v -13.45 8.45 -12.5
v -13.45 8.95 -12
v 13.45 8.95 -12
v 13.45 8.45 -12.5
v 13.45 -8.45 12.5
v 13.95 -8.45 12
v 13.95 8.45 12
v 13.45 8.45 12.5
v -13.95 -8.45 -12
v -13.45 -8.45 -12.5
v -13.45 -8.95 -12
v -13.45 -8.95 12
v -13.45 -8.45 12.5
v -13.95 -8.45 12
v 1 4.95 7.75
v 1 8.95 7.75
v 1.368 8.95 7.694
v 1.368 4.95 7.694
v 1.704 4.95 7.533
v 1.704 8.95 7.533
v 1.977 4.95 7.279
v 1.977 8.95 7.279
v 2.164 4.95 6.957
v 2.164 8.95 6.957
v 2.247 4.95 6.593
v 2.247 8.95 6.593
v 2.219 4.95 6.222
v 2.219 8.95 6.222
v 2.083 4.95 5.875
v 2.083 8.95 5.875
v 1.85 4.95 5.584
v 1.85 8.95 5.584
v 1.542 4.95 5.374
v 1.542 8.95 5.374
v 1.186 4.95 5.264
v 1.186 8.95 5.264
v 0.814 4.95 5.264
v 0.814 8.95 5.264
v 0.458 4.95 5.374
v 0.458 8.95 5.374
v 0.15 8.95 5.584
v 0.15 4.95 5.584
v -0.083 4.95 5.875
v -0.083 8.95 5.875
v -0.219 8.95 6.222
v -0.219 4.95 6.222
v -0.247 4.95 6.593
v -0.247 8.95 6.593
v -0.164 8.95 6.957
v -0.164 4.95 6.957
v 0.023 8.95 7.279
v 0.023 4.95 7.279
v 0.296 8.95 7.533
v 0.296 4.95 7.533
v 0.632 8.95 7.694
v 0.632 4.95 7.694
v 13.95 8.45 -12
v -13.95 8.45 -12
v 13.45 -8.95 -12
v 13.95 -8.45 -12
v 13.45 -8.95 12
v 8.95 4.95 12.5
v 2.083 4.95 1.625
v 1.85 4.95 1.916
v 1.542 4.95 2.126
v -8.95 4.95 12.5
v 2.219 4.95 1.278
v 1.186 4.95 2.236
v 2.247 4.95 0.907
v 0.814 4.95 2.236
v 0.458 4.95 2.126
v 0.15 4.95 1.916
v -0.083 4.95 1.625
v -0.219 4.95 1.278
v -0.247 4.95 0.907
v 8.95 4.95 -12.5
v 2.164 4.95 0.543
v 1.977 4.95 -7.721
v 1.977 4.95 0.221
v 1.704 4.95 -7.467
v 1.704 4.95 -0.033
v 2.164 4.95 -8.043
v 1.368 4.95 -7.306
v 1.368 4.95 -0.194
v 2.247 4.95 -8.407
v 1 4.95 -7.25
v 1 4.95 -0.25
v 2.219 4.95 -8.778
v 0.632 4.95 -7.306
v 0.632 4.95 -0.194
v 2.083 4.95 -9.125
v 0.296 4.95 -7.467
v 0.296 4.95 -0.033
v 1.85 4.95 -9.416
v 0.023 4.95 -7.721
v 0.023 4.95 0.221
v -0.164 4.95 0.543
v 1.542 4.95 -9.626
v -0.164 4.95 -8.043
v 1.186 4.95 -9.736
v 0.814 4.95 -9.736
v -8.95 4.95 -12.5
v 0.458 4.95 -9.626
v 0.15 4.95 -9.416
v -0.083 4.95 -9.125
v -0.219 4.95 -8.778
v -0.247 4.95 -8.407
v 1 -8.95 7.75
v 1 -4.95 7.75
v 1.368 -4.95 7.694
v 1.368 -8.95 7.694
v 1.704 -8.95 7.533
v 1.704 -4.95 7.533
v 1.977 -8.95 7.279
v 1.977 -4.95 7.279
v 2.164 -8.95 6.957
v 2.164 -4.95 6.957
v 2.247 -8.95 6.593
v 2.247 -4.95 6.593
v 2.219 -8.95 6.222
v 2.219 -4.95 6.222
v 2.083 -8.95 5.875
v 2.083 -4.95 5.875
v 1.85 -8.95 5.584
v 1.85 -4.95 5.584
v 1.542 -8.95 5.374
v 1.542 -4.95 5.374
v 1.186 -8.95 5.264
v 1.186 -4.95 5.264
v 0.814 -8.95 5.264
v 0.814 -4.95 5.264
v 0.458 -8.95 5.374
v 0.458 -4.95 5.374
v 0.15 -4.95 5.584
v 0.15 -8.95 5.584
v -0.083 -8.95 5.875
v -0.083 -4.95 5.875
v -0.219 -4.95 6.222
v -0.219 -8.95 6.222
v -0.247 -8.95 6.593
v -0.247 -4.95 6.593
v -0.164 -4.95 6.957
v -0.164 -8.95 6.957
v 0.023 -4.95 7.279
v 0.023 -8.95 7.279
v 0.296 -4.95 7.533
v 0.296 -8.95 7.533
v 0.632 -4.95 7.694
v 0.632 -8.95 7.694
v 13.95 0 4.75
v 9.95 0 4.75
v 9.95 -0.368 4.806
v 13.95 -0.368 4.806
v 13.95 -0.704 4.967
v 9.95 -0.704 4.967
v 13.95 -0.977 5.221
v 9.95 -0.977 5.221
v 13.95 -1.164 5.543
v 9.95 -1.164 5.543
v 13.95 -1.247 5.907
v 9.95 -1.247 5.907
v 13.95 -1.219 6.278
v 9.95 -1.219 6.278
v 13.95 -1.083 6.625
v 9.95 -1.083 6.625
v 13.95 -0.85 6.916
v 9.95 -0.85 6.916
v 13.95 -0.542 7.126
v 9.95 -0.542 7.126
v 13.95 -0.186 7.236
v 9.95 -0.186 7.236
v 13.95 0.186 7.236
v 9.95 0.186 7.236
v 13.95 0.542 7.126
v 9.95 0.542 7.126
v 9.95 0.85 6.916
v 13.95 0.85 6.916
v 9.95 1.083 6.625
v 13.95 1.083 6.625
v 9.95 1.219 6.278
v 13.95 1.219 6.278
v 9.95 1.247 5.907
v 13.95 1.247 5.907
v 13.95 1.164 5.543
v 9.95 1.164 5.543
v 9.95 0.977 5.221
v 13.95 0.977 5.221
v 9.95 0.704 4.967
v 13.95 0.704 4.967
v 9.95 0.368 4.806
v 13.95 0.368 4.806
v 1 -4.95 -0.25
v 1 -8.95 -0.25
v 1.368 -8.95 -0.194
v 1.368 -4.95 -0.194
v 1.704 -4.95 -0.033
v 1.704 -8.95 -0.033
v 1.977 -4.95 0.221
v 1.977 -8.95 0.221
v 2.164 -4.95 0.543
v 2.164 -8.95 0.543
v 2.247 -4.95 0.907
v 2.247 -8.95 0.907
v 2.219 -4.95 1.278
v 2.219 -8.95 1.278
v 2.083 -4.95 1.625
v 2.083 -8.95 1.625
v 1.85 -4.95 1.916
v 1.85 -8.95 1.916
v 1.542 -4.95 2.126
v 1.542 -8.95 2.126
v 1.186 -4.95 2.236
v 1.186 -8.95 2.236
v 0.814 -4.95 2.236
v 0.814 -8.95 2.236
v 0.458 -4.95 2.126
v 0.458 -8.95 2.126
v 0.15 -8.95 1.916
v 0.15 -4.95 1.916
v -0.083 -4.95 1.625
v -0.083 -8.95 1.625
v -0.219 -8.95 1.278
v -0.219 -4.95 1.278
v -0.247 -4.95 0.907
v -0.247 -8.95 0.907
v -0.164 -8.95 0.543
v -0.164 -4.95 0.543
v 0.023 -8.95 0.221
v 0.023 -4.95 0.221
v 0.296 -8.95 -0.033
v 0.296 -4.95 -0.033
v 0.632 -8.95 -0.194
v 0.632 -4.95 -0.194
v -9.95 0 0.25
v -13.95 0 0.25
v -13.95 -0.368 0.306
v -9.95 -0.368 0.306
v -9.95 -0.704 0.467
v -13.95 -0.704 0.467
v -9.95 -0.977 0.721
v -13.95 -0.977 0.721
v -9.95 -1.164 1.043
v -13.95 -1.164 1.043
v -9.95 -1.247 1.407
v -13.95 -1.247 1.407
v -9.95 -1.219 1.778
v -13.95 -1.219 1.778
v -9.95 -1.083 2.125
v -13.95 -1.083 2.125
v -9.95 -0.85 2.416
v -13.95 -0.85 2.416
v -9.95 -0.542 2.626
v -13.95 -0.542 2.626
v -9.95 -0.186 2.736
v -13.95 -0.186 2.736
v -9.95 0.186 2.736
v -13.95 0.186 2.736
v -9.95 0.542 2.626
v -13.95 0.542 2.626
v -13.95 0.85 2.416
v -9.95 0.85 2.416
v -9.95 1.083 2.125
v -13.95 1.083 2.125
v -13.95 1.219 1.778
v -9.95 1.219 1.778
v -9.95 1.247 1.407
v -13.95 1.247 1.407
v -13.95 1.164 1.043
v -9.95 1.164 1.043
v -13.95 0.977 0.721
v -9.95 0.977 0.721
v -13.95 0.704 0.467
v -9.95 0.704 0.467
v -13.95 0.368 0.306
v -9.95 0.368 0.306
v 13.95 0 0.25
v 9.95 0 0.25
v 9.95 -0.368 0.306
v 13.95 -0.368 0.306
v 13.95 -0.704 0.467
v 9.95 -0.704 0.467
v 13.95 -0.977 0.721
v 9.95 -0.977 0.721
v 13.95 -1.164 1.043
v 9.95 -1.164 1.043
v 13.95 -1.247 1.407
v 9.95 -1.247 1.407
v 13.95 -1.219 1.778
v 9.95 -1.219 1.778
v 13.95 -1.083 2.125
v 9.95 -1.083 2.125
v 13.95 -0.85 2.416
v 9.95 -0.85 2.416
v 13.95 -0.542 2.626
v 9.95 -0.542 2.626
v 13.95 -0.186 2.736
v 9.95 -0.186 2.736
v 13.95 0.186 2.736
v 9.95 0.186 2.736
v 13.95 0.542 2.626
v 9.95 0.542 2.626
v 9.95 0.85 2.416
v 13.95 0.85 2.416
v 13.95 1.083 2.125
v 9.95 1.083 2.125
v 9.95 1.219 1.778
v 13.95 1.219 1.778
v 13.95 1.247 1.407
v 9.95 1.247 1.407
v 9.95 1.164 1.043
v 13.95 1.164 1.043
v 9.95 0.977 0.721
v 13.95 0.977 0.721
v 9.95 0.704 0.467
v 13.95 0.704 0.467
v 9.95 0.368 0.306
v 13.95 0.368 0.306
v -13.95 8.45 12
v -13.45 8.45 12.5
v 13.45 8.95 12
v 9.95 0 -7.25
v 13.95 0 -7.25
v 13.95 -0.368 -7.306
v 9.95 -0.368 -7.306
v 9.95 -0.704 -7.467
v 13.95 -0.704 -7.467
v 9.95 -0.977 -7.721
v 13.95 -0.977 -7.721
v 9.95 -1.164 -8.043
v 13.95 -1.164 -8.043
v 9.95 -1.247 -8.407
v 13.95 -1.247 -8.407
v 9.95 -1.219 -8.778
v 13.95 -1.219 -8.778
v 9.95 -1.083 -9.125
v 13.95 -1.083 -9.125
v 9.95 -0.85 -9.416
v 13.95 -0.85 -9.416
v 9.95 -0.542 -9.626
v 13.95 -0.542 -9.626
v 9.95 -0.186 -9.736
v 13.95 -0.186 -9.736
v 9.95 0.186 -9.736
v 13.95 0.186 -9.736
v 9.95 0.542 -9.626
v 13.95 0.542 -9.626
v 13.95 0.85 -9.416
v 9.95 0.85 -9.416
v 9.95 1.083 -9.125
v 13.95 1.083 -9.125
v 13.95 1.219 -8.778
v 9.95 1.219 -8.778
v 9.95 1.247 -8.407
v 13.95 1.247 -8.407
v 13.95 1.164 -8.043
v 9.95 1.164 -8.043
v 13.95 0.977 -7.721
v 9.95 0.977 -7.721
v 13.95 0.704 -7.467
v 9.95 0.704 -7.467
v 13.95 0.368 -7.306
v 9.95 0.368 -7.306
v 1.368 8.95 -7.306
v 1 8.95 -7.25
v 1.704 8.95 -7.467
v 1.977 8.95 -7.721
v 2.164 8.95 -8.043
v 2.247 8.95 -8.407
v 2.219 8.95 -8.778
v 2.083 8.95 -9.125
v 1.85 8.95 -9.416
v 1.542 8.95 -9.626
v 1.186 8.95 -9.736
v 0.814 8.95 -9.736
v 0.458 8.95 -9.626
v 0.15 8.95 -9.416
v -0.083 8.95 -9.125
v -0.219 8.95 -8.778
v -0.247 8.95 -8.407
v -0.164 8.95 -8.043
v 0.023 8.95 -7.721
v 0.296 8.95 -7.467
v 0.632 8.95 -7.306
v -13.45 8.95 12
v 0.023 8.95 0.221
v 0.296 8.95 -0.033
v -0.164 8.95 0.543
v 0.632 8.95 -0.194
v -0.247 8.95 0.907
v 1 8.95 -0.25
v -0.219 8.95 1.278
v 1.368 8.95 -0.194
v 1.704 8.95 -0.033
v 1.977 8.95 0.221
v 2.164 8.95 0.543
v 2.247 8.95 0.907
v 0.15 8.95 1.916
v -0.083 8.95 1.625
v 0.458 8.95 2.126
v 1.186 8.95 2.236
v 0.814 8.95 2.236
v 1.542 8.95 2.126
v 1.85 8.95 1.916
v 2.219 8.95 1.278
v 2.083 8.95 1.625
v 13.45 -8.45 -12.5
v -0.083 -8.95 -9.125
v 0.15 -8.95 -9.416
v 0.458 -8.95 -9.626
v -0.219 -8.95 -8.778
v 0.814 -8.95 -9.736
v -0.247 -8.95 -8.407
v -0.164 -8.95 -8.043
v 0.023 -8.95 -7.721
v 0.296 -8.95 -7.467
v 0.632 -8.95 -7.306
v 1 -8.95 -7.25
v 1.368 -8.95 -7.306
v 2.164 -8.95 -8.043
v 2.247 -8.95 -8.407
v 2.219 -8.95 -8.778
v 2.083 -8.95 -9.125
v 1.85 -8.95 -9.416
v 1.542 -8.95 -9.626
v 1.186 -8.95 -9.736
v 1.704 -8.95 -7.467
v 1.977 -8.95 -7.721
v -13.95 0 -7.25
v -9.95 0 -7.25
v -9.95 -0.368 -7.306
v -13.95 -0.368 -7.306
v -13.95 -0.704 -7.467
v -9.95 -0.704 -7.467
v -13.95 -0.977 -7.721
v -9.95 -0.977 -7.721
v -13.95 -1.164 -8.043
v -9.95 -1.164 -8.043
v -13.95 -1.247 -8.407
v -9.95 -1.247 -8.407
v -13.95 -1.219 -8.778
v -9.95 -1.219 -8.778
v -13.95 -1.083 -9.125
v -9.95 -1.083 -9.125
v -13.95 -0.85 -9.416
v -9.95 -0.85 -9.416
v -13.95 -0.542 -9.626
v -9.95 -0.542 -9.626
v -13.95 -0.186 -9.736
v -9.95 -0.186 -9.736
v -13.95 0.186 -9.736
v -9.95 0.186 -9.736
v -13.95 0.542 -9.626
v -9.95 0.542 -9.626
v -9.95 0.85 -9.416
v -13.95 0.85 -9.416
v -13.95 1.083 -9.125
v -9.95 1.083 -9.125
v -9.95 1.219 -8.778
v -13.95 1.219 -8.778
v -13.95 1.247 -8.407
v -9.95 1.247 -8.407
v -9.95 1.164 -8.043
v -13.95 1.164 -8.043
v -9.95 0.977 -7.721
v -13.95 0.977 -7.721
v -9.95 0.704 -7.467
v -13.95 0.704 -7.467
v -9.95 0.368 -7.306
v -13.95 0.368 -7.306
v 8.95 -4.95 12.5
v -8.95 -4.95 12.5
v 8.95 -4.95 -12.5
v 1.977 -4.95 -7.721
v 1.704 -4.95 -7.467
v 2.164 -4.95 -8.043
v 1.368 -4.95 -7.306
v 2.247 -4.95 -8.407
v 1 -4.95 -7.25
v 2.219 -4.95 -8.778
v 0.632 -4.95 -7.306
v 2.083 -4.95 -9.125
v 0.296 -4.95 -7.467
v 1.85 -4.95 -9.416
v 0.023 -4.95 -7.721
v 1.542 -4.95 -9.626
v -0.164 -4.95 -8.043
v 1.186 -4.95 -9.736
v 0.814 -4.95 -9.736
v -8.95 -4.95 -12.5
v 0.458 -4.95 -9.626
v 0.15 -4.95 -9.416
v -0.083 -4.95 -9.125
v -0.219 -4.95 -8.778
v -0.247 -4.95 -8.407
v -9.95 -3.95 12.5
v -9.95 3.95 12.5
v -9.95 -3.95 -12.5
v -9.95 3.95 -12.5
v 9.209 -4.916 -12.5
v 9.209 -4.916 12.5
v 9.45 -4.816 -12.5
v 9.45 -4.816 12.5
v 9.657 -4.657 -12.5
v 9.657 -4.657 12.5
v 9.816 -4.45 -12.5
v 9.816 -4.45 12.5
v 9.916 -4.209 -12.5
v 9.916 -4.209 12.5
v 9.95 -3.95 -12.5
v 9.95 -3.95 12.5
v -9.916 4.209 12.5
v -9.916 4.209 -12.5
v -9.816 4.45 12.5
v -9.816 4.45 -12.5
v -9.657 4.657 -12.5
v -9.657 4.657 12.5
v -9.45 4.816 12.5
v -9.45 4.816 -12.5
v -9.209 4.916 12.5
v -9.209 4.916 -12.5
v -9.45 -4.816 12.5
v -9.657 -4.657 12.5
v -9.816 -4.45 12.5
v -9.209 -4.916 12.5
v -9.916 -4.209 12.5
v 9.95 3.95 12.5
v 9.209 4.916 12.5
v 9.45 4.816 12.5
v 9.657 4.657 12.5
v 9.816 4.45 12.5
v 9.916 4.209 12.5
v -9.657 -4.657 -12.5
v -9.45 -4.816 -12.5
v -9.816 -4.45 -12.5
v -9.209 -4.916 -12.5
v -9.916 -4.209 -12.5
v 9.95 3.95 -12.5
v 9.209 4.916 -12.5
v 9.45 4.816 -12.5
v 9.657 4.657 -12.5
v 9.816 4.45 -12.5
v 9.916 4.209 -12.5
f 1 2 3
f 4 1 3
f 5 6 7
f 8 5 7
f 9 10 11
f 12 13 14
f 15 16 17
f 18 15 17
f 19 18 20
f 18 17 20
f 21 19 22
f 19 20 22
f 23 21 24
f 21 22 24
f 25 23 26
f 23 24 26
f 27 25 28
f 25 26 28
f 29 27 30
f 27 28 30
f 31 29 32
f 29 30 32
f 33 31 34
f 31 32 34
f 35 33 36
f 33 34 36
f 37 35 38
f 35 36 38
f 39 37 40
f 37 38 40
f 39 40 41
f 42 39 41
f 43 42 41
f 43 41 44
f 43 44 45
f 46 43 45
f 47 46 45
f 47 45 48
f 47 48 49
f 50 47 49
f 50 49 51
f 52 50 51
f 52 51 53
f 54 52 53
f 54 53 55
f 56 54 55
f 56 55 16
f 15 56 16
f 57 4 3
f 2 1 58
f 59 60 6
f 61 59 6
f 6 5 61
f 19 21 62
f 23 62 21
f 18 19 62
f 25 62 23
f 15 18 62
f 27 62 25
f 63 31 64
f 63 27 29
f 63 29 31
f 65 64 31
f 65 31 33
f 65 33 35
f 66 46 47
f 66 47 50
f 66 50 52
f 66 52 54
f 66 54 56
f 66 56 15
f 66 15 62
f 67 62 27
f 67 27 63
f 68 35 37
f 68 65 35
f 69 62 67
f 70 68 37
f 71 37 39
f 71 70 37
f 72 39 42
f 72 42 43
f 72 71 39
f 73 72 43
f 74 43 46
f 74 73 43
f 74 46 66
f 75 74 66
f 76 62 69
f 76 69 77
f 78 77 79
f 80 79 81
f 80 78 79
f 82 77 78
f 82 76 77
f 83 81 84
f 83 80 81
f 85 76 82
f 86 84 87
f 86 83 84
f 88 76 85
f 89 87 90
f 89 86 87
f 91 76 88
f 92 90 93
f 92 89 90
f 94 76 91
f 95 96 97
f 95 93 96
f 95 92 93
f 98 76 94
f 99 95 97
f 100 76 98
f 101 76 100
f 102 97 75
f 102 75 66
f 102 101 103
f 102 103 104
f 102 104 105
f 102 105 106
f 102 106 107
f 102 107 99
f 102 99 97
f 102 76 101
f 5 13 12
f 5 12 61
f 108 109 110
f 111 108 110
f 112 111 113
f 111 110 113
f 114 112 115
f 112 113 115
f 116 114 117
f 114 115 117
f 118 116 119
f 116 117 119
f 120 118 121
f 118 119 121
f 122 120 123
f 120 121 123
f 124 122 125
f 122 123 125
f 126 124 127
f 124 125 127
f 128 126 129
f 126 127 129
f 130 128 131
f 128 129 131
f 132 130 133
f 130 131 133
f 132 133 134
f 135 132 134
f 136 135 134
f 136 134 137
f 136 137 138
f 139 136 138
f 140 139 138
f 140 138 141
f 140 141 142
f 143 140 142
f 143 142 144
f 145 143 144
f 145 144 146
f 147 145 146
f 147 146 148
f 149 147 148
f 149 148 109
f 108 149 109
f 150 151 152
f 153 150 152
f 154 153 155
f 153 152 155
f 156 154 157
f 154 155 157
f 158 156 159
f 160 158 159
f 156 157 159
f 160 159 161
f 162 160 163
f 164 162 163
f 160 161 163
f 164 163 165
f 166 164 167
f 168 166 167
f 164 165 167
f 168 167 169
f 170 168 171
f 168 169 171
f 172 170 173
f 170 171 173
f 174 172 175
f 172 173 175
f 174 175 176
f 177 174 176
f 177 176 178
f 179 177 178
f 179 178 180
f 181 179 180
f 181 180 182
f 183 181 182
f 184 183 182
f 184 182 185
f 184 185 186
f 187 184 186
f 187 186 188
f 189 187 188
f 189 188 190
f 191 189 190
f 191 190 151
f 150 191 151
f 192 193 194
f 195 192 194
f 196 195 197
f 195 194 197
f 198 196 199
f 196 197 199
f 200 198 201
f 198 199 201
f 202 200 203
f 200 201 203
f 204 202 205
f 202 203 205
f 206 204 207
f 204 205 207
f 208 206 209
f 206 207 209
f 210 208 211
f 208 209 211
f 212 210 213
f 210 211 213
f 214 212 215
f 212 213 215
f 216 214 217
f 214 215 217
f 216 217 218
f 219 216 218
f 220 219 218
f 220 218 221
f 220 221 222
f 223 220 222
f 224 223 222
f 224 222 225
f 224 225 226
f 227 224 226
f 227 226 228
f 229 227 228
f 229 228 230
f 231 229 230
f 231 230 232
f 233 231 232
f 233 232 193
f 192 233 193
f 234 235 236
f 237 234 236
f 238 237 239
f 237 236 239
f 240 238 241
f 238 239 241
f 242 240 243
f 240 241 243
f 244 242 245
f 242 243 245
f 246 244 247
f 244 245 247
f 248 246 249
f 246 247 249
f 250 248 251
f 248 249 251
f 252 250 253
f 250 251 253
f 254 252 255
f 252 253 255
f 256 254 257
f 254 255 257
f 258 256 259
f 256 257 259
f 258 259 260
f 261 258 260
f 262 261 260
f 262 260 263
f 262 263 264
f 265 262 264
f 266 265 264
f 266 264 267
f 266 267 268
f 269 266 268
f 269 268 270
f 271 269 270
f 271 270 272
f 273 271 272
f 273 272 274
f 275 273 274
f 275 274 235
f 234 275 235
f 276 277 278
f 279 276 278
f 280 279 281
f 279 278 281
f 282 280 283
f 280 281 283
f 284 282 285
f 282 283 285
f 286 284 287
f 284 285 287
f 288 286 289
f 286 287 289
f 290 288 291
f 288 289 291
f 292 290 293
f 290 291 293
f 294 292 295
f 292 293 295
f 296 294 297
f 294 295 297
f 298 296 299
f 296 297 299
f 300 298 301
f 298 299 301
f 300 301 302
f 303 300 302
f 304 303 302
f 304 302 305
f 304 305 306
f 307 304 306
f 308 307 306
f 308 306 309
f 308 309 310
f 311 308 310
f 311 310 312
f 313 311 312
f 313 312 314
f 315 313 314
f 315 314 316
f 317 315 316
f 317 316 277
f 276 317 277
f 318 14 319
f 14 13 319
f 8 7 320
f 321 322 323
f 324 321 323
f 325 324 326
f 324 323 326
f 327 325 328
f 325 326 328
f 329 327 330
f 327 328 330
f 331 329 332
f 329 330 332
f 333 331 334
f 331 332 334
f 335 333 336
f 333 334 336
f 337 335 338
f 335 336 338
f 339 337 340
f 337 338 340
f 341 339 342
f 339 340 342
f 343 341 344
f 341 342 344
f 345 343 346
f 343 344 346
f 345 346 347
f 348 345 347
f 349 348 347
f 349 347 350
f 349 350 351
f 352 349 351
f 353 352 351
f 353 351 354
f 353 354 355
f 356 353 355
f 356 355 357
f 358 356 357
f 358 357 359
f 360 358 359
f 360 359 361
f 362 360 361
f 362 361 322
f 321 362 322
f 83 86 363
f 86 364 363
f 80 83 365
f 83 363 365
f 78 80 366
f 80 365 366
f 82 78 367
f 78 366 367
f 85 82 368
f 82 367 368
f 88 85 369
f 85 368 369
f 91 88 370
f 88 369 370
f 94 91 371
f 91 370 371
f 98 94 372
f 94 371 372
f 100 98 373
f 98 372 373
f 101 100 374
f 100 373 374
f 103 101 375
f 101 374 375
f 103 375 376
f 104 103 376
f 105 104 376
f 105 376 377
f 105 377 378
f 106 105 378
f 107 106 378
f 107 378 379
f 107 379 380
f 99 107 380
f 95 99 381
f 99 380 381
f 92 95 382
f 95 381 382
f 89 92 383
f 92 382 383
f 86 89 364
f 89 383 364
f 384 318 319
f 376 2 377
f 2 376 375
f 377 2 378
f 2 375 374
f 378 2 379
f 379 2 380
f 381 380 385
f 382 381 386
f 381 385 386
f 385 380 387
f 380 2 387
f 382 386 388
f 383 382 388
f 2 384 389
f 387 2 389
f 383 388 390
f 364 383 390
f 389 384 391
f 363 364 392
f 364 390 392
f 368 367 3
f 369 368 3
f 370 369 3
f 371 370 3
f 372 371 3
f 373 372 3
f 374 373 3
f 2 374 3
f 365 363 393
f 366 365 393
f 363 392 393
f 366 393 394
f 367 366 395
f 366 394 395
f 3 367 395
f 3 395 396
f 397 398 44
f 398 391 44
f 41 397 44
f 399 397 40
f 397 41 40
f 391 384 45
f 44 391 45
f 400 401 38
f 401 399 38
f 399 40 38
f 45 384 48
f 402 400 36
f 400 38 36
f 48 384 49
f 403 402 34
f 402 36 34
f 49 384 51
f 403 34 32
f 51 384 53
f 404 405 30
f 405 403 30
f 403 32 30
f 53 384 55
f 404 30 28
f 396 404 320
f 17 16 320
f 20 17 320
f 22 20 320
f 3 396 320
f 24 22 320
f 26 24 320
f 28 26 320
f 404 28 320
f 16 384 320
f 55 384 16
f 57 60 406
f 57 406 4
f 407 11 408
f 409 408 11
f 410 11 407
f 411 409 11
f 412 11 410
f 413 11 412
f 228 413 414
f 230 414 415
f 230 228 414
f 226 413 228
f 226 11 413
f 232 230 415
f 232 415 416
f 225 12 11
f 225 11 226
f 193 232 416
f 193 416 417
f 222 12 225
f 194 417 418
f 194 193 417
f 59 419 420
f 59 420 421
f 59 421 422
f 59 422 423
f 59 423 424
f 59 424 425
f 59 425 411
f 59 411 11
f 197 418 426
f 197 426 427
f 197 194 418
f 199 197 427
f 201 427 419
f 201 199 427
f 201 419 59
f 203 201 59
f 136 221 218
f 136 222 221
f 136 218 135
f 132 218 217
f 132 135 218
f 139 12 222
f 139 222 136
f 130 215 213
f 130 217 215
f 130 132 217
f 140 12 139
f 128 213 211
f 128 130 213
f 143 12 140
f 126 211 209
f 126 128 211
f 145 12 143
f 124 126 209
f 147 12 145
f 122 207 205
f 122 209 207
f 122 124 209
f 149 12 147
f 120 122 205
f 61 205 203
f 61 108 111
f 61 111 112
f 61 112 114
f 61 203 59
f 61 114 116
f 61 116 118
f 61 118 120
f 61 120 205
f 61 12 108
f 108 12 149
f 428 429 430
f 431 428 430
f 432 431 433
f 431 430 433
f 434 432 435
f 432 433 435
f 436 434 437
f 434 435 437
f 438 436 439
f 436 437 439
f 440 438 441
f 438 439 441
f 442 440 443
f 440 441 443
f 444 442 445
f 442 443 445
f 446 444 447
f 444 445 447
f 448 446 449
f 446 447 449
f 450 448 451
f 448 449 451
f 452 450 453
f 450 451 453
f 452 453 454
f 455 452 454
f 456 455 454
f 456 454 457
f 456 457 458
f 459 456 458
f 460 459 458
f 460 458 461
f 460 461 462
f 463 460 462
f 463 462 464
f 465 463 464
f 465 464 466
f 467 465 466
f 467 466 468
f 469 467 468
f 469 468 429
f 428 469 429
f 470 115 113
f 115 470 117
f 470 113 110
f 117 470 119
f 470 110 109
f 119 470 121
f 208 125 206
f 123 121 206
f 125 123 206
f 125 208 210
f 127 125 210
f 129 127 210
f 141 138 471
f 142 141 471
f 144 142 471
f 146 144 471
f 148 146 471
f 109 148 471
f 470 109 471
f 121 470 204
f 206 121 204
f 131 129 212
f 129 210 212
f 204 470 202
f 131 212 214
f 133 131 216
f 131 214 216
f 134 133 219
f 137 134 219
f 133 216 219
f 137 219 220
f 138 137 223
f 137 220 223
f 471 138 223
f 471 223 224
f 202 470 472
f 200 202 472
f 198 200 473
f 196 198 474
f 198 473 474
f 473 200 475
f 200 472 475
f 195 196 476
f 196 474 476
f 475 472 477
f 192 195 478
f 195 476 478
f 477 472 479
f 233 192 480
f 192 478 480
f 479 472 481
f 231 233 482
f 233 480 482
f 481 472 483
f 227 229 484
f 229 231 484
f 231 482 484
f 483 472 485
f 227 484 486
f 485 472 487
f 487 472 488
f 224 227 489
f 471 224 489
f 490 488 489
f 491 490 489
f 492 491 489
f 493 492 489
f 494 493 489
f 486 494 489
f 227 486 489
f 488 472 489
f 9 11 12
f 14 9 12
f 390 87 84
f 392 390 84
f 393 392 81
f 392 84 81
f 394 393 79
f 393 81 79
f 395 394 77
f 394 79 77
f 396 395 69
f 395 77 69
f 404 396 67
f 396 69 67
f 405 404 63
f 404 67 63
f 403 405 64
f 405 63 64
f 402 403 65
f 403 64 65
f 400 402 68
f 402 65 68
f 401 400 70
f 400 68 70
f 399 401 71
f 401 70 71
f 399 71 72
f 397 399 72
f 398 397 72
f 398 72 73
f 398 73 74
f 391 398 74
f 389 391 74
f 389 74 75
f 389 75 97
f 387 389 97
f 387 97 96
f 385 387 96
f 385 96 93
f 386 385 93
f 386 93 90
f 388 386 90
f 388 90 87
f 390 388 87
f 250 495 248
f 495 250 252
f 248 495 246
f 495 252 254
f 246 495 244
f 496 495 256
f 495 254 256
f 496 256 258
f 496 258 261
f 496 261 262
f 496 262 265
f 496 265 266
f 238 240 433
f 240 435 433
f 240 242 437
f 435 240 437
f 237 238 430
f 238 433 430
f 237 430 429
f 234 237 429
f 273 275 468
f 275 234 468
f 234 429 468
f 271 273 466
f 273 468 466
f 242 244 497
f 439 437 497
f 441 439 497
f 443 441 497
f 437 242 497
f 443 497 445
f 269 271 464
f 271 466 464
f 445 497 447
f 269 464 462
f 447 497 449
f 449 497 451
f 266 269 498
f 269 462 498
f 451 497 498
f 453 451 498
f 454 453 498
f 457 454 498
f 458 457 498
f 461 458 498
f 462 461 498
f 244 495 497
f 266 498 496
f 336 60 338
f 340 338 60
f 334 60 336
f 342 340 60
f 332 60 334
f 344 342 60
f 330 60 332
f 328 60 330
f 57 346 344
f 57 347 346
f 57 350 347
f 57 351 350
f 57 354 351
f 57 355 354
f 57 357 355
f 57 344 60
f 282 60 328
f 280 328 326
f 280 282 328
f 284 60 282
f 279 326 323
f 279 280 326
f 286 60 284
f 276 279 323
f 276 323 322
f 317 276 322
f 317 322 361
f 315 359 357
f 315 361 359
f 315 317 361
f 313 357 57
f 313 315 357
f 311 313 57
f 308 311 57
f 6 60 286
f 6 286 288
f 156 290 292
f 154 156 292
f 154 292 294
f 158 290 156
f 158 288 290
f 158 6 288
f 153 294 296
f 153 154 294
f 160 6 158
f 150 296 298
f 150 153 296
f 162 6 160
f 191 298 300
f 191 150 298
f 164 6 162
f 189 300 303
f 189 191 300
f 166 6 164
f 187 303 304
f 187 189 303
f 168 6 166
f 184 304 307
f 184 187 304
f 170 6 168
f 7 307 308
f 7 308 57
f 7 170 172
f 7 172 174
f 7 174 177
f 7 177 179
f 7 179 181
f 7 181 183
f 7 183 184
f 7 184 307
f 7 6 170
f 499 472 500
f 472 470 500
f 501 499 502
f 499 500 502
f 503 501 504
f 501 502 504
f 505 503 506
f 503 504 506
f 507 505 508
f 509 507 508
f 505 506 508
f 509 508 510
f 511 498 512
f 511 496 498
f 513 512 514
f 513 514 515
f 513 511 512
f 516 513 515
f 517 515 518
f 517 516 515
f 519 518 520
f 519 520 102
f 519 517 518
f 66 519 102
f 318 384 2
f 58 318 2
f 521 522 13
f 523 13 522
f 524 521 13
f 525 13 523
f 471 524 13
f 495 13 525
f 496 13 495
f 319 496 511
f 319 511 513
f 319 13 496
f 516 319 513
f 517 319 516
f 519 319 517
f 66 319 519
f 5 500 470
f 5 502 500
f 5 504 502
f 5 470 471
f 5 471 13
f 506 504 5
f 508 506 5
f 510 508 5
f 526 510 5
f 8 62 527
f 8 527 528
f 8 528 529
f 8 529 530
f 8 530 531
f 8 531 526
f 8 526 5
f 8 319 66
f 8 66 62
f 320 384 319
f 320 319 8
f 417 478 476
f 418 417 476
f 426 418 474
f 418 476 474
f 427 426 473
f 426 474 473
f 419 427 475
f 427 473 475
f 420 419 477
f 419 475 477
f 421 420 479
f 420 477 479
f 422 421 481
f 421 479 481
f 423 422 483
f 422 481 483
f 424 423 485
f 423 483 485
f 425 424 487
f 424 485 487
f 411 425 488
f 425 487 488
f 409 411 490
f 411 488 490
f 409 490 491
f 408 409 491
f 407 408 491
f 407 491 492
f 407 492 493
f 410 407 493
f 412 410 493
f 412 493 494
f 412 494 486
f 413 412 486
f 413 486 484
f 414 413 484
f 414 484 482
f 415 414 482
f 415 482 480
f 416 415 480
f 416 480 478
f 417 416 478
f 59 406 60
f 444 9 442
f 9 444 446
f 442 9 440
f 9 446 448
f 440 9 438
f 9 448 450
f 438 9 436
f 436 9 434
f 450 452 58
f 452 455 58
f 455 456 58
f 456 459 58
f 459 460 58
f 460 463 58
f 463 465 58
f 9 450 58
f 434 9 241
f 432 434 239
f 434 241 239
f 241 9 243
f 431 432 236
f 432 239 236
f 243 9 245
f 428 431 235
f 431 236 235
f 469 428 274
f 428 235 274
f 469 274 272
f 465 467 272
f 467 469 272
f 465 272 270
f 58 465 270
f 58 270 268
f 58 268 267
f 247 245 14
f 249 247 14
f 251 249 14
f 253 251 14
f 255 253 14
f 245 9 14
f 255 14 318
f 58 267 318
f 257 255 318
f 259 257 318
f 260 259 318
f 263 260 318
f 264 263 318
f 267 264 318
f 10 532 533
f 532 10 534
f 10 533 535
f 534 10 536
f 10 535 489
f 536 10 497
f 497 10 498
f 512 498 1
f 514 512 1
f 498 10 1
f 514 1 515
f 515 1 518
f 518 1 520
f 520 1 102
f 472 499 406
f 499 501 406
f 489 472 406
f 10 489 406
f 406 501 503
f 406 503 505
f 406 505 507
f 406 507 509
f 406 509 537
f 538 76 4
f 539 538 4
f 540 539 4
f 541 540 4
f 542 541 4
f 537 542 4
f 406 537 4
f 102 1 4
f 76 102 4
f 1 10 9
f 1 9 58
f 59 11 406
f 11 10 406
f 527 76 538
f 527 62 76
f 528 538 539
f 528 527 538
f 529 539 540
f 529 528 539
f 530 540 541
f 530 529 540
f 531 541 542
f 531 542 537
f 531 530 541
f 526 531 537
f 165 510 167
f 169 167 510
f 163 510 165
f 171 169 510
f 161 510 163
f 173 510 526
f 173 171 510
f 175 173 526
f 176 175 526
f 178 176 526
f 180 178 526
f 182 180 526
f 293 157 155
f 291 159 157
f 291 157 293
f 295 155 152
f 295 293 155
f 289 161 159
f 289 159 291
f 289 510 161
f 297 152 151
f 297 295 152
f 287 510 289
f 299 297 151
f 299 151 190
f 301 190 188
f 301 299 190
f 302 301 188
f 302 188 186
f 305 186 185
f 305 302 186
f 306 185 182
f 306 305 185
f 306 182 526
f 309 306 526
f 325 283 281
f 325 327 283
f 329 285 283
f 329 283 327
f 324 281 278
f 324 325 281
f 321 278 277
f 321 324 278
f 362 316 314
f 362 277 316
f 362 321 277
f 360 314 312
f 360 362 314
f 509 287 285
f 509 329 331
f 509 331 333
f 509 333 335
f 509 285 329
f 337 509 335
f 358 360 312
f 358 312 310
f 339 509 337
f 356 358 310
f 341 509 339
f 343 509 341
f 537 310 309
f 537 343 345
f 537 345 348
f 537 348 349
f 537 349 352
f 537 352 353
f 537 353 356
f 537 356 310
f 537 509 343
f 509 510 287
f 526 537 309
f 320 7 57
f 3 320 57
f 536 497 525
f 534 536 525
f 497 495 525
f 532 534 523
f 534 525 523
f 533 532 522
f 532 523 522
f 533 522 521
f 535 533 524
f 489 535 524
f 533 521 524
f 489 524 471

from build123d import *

# Parameters (mm, degrees)
SKETCH_2_W             = 27.9
SKETCH_2_H             = 17.9
EXTRUDE_1_DEPTH        = 12.5
HOLE_WIZARD_M3_1_D     = 2.5
HOLE_WIZARD_M3_2_D     = 2.5
HOLE_WIZARD_M3_3_D     = 2.5
SKETCH_9_W             = 19.9
SKETCH_9_H             = 9.9
CUT_EXTRUDE_1_DEPTH    = 26
CHAMFER_2_SIZE         = 0.5
HOLE_WIZARD_M3_4_D     = 2.5
HOLE_WIZARD_M3_6_D     = 2.5
HOLE_WIZARD_M3_6_DEPTH = 4
HOLE_WIZARD_M3_7_D     = 2.5
FILLET_1_R             = 1


with BuildPart() as part:
    # 草图2 → 凸台-拉伸1 (new body, symmetric)
    with BuildSketch(Plane.XY):
        Rectangle(SKETCH_2_W, SKETCH_2_H)
    extrude(amount=EXTRUDE_1_DEPTH, both=True)

    # M3 螺纹孔1 (through all)
    with Locations(Plane(origin=(1, -8.95, -8.5), x_dir=(0, 0, -1), z_dir=(0, -1, 0))):
        with Locations((0, 0)):
            Hole(HOLE_WIZARD_M3_1_D / 2)

    # M3 螺纹孔2 (through all)
    with Locations(Plane(origin=(-13.95, 0, -8.5), x_dir=(0, 0, -1), z_dir=(-1, 0, 0))):
        with Locations((0, 0)):
            Hole(HOLE_WIZARD_M3_2_D / 2)

    # M3 螺纹孔3 (through all)
    with Locations(Plane(origin=(1, -8.95, 6.5), x_dir=(0, 0, -1), z_dir=(0, -1, 0))):
        with Locations((0, 0)):
            Hole(HOLE_WIZARD_M3_3_D / 2)

    # 草图9 → 切除-拉伸1 (cut, through all)
    with BuildSketch(Plane(origin=(0, 0, -12.5), x_dir=(-1, 0, 0), z_dir=(0, 0, -1))):
        Rectangle(SKETCH_9_W, SKETCH_9_H)
    extrude(amount=-CUT_EXTRUDE_1_DEPTH, mode=Mode.SUBTRACT)

    # 倒角2
    chamfer_2_edges = [part.edges().sort_by_distance(p)[0] for p in [
        (-13.95, 0, 12.5),
        (0, -8.95, 12.5),
        (13.95, 0, 12.5),
        (0, -8.95, -12.5),
        (-13.95, 0, -12.5),
        (0, 8.95, -12.5),
        (13.95, 0, -12.5),
        (13.95, -8.95, 0),
        (-13.95, -8.95, 0),
        (-13.95, 8.95, 0),
        (13.95, 8.95, 0),
        (0, 8.95, 12.5),
    ]]
    chamfer(chamfer_2_edges, length=CHAMFER_2_SIZE)

    # M3 螺纹孔4 (through all)
    with Locations(Plane(origin=(13.95, 0, 1.5), x_dir=(0, 0, 1), z_dir=(1, 0, 0))):
        with Locations((0, 0)):
            Hole(HOLE_WIZARD_M3_4_D / 2)

    # M3 螺纹孔6
    with Locations(Plane(origin=(13.95, 0, 6), x_dir=(0, 0, 1), z_dir=(1, 0, 0))):
        with Locations((0, 0)):
            Hole(HOLE_WIZARD_M3_6_D / 2, depth=HOLE_WIZARD_M3_6_DEPTH)

    # M3 螺纹孔7 (through all)
    with Locations(Plane(origin=(1, 8.95, 1), x_dir=(0, 0, 1), z_dir=(0, 1, 0))):
        with Locations((0, 0)):
            Hole(HOLE_WIZARD_M3_7_D / 2)

    # 圆角1
    fillet_1_edges = [part.edges().sort_by_distance(p)[0] for p in [
        (-9.95, 4.95, 0),
        (9.95, -4.95, 0),
        (9.95, 4.95, 0),
        (-9.95, -4.95, 0),
    ]]
    fillet(fillet_1_edges, radius=FILLET_1_R)


solid = part.part
